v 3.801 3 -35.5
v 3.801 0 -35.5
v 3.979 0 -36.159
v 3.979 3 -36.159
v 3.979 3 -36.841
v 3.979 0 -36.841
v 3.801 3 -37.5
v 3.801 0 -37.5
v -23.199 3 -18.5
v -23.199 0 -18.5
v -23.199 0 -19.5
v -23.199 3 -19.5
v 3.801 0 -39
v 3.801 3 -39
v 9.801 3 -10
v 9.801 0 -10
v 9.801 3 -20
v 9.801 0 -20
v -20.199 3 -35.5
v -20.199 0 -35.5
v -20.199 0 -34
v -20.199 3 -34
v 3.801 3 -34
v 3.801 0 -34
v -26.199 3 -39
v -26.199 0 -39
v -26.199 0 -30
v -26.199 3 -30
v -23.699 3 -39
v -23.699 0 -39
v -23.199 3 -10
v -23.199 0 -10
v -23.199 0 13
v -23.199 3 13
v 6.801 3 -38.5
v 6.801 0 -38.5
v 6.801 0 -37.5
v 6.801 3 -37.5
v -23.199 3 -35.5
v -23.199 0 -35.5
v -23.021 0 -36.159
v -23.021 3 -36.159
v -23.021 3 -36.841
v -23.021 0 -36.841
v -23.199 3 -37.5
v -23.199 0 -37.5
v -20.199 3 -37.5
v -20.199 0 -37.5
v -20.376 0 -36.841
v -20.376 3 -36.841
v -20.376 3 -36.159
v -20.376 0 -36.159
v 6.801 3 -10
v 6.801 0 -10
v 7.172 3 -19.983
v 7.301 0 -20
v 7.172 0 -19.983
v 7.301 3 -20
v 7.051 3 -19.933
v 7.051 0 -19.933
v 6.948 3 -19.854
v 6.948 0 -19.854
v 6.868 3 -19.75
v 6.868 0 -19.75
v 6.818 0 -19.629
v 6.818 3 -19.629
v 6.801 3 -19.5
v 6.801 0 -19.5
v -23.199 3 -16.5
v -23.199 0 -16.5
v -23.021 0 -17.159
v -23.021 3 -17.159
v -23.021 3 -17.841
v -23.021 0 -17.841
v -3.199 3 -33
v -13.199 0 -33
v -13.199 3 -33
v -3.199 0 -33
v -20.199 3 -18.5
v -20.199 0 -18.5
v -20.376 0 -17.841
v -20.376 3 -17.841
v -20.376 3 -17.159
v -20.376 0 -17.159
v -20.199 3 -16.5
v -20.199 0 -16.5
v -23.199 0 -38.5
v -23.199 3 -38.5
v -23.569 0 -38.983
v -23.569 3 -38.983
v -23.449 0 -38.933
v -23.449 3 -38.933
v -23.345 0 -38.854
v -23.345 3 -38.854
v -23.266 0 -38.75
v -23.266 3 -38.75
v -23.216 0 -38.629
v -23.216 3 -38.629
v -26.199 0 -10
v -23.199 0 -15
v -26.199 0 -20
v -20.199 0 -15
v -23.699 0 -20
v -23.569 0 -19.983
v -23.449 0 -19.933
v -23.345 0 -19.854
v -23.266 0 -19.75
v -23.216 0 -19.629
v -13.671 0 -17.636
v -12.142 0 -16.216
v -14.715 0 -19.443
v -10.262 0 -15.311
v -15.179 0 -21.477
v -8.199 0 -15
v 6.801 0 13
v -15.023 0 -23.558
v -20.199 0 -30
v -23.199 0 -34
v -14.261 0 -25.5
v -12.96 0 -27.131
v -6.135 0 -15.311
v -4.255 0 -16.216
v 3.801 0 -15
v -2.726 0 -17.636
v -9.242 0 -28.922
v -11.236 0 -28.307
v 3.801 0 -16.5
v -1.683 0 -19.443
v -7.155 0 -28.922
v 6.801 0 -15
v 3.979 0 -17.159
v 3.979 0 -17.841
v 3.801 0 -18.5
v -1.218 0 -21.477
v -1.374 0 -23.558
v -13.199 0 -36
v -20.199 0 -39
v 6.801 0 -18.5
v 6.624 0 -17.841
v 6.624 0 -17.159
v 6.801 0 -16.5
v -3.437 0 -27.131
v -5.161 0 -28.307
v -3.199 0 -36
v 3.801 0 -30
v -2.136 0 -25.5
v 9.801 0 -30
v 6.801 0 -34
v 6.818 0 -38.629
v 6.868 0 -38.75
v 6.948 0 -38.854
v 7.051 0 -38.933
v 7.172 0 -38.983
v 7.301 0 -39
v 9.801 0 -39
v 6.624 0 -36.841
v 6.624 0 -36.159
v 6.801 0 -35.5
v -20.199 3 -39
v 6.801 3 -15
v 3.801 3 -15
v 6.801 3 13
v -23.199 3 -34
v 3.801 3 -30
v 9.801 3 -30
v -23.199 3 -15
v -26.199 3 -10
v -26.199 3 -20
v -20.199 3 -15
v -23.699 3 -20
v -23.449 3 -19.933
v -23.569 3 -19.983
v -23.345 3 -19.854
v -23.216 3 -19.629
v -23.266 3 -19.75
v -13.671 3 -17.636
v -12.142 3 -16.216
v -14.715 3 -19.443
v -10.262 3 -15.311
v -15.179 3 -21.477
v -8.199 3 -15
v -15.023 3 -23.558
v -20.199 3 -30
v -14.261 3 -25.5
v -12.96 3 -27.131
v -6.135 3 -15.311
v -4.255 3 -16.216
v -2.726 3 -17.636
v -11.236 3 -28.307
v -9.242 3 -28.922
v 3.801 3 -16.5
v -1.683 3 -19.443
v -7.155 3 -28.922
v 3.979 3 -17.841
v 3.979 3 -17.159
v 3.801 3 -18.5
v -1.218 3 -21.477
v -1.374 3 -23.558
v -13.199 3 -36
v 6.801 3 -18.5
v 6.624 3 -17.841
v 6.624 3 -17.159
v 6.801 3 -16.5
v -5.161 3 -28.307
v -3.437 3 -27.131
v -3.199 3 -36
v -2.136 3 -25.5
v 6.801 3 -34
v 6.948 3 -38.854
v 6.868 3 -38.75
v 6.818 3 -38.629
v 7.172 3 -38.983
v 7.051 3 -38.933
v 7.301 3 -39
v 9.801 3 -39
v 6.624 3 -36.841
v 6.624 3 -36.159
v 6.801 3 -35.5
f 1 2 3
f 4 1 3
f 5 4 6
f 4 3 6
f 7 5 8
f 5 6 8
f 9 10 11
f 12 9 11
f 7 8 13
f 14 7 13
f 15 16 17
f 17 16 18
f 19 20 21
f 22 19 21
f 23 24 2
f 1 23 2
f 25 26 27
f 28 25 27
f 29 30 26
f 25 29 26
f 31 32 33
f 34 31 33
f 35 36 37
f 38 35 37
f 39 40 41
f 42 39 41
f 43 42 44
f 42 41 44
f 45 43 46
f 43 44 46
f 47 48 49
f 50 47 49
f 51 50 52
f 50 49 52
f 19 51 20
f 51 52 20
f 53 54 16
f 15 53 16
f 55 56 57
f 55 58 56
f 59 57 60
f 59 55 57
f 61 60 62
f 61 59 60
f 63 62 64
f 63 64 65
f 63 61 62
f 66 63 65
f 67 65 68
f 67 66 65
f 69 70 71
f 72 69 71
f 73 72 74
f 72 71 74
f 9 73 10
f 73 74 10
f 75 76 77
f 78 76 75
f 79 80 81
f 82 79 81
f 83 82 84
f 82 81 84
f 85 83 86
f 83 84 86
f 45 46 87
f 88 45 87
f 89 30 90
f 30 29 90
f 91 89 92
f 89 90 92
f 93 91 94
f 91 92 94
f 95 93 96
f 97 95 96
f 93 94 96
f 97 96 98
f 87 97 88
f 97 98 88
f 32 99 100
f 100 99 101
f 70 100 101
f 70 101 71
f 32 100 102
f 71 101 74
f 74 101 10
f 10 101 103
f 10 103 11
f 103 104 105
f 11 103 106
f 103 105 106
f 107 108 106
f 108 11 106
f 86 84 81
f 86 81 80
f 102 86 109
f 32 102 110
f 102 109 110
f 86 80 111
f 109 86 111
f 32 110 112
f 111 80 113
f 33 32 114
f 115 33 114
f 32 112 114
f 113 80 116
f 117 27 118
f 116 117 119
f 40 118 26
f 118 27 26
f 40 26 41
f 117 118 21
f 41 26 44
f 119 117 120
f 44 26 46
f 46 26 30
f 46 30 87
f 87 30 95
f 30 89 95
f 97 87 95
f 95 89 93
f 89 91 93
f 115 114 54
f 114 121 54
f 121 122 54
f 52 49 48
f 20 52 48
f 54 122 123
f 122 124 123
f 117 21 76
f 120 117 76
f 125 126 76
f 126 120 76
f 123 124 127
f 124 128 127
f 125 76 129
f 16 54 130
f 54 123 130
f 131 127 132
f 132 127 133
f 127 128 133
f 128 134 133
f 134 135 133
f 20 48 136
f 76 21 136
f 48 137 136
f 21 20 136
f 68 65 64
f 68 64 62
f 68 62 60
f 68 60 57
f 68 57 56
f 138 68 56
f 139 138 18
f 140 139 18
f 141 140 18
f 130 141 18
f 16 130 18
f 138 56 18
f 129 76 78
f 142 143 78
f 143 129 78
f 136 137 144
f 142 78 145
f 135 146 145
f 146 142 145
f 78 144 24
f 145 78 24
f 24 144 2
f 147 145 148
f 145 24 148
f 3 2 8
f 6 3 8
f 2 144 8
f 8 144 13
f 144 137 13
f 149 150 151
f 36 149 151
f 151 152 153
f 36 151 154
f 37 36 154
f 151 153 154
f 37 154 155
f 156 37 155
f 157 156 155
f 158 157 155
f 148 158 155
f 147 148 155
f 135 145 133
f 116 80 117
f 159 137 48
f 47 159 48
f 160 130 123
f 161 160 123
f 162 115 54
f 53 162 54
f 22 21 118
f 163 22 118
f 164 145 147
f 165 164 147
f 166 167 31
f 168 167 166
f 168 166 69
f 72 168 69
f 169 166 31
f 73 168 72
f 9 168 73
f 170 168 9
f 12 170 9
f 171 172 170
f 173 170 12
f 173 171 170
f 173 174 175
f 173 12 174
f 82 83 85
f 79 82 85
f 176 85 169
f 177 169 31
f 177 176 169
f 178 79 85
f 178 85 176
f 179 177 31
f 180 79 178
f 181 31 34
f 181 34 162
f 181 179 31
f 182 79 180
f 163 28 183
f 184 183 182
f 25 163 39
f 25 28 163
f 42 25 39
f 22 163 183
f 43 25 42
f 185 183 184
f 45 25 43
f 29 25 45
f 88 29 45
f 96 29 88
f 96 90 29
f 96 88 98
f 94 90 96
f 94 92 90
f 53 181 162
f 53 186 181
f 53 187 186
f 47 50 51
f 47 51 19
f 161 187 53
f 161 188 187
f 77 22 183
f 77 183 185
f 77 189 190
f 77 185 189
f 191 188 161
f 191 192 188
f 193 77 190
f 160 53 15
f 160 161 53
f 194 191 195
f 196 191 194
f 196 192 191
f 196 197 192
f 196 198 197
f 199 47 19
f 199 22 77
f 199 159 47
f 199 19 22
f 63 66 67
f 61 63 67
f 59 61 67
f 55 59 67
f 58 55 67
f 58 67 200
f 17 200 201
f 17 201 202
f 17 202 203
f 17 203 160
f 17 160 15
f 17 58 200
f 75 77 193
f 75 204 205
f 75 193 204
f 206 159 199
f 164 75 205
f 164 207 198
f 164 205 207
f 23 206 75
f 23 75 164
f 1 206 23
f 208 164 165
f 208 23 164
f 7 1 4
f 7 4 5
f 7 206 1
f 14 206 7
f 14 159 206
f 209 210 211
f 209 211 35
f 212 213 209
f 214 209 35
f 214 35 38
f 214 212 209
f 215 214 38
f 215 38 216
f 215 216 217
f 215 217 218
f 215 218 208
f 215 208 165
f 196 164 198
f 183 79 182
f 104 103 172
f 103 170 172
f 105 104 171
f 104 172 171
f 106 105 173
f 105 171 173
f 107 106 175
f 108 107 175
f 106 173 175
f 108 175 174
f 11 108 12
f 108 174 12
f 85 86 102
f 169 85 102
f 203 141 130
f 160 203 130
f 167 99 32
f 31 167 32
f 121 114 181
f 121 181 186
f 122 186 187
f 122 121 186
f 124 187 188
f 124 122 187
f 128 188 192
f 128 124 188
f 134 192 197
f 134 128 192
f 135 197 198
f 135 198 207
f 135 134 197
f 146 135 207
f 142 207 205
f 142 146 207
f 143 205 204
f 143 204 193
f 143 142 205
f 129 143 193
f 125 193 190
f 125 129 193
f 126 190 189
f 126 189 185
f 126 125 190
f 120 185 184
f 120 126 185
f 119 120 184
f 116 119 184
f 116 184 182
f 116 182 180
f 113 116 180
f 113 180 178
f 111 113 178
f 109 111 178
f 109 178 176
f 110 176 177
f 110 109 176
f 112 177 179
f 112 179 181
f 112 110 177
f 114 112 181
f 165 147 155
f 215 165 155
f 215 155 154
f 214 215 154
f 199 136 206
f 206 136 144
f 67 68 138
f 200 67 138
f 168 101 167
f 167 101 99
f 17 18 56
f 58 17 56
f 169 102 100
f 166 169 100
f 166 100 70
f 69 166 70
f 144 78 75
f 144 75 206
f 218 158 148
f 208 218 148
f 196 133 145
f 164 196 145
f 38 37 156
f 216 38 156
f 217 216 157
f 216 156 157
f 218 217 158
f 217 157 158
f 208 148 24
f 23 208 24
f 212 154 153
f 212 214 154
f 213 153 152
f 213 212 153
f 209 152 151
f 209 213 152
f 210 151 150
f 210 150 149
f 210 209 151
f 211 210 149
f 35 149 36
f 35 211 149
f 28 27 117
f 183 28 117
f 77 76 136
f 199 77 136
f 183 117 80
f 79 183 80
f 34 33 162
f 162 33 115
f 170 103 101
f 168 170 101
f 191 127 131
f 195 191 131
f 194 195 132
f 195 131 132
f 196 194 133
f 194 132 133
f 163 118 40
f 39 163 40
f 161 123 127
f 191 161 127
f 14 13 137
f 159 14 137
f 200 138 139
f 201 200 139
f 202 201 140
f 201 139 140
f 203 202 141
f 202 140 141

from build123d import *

# Parameters (mm, degrees)
SKETCH1_R           = 7
SKETCH1_W           = 10
SKETCH1_H           = 3
BOSS_EXTRUDE1_DEPTH = 3
FILLET1_R           = 0.5


with BuildPart() as part:
    # Sketch1 → Boss-Extrude1 (new body)
    with BuildSketch(Plane(origin=(0, 0, 0), x_dir=(1, 0, 0), z_dir=(0, 1, 0))):
        with BuildLine():
            Line((-23.198633067, -13), (6.801366933, -13))
            Line((6.801366933, -13), (6.801366933, 10))
            Line((6.801366933, 10), (9.801366933, 10))
            Line((9.801366933, 10), (9.801366933, 20))
            Line((9.801366933, 20), (6.801366933, 20))
            Line((6.801366933, 20), (6.801366933, 18.5))
            ThreePointArc((6.801366933, 18.5), (6.601366933, 17.5), (6.801366933, 16.5))
            Line((6.801366933, 16.5), (6.801366933, 15))
            Line((6.801366933, 15), (3.801366933, 15))
            Line((3.801366933, 15), (3.801366933, 16.5))
            ThreePointArc((3.801366933, 16.5), (4.001366933, 17.5), (3.801366933, 18.5))
            Line((3.801366933, 18.5), (3.801366933, 30))
            Line((3.801366933, 30), (9.801366933, 30))
            Line((9.801366933, 30), (9.801366933, 39))
            Line((9.801366933, 39), (6.801366933, 39))
            Line((6.801366933, 39), (6.801366933, 37.5))
            ThreePointArc((6.801366933, 37.5), (6.601366933, 36.5), (6.801366933, 35.5))
            Line((6.801366933, 35.5), (6.801366933, 34))
            Line((6.801366933, 34), (3.801366933, 34))
            Line((3.801366933, 34), (3.801366933, 35.5))
            ThreePointArc((3.801366933, 35.5), (4.001366933, 36.5), (3.801366933, 37.5))
            Line((3.801366933, 37.5), (3.801366933, 39))
            Line((3.801366933, 39), (-20.198633067, 39))
            Line((-20.198633067, 39), (-20.198633067, 37.5))
            ThreePointArc((-20.198633067, 37.5), (-20.398633067, 36.5), (-20.198633067, 35.5))
            Line((-20.198633067, 35.5), (-20.198633067, 34))
            Line((-20.198633067, 34), (-23.198633067, 34))
            Line((-23.198633067, 34), (-23.198633067, 35.5))
            ThreePointArc((-23.198633067, 35.5), (-22.998633067, 36.5), (-23.198633067, 37.5))
            Line((-23.198633067, 37.5), (-23.198633067, 39))
            Line((-23.198633067, 39), (-26.198633067, 39))
            Line((-26.198633067, 39), (-26.198633067, 30))
            Line((-26.198633067, 30), (-20.198633067, 30))
            Line((-20.198633067, 30), (-20.198633067, 18.5))
            ThreePointArc((-20.198633067, 18.5), (-20.398633067, 17.5), (-20.198633067, 16.5))
            Line((-20.198633067, 16.5), (-20.198633067, 15))
            Line((-20.198633067, 15), (-23.198633067, 15))
            Line((-23.198633067, 15), (-23.198633067, 16.5))
            ThreePointArc((-23.198633067, 16.5), (-22.998633067, 17.5), (-23.198633067, 18.5))
            Line((-23.198633067, 18.5), (-23.198633067, 20))
            Line((-23.198633067, 20), (-26.198633067, 20))
            Line((-26.198633067, 20), (-26.198633067, 10))
            Line((-26.198633067, 10), (-23.198633067, 10))
            Line((-23.198633067, 10), (-23.198633067, -13))
        make_face()
        with Locations(Location((-8.198633067, 22, 0), (0, 0, 270))):
            Circle(SKETCH1_R, mode=Mode.SUBTRACT)
        with Locations((-8.198633067, 34.5)):
            Rectangle(SKETCH1_W, SKETCH1_H, mode=Mode.SUBTRACT)
    extrude(amount=BOSS_EXTRUDE1_DEPTH)

    # Fillet1
    fillet1_edges = [part.edges().sort_by_distance(p)[0] for p in [
        (-23.198633067, 1.5, -39),
        (6.801366933, 1.5, -39),
        (6.801366933, 1.5, -20),
        (-23.198633067, 1.5, -20),
    ]]
    fillet(fillet1_edges, radius=FILLET1_R)


solid = part.part
